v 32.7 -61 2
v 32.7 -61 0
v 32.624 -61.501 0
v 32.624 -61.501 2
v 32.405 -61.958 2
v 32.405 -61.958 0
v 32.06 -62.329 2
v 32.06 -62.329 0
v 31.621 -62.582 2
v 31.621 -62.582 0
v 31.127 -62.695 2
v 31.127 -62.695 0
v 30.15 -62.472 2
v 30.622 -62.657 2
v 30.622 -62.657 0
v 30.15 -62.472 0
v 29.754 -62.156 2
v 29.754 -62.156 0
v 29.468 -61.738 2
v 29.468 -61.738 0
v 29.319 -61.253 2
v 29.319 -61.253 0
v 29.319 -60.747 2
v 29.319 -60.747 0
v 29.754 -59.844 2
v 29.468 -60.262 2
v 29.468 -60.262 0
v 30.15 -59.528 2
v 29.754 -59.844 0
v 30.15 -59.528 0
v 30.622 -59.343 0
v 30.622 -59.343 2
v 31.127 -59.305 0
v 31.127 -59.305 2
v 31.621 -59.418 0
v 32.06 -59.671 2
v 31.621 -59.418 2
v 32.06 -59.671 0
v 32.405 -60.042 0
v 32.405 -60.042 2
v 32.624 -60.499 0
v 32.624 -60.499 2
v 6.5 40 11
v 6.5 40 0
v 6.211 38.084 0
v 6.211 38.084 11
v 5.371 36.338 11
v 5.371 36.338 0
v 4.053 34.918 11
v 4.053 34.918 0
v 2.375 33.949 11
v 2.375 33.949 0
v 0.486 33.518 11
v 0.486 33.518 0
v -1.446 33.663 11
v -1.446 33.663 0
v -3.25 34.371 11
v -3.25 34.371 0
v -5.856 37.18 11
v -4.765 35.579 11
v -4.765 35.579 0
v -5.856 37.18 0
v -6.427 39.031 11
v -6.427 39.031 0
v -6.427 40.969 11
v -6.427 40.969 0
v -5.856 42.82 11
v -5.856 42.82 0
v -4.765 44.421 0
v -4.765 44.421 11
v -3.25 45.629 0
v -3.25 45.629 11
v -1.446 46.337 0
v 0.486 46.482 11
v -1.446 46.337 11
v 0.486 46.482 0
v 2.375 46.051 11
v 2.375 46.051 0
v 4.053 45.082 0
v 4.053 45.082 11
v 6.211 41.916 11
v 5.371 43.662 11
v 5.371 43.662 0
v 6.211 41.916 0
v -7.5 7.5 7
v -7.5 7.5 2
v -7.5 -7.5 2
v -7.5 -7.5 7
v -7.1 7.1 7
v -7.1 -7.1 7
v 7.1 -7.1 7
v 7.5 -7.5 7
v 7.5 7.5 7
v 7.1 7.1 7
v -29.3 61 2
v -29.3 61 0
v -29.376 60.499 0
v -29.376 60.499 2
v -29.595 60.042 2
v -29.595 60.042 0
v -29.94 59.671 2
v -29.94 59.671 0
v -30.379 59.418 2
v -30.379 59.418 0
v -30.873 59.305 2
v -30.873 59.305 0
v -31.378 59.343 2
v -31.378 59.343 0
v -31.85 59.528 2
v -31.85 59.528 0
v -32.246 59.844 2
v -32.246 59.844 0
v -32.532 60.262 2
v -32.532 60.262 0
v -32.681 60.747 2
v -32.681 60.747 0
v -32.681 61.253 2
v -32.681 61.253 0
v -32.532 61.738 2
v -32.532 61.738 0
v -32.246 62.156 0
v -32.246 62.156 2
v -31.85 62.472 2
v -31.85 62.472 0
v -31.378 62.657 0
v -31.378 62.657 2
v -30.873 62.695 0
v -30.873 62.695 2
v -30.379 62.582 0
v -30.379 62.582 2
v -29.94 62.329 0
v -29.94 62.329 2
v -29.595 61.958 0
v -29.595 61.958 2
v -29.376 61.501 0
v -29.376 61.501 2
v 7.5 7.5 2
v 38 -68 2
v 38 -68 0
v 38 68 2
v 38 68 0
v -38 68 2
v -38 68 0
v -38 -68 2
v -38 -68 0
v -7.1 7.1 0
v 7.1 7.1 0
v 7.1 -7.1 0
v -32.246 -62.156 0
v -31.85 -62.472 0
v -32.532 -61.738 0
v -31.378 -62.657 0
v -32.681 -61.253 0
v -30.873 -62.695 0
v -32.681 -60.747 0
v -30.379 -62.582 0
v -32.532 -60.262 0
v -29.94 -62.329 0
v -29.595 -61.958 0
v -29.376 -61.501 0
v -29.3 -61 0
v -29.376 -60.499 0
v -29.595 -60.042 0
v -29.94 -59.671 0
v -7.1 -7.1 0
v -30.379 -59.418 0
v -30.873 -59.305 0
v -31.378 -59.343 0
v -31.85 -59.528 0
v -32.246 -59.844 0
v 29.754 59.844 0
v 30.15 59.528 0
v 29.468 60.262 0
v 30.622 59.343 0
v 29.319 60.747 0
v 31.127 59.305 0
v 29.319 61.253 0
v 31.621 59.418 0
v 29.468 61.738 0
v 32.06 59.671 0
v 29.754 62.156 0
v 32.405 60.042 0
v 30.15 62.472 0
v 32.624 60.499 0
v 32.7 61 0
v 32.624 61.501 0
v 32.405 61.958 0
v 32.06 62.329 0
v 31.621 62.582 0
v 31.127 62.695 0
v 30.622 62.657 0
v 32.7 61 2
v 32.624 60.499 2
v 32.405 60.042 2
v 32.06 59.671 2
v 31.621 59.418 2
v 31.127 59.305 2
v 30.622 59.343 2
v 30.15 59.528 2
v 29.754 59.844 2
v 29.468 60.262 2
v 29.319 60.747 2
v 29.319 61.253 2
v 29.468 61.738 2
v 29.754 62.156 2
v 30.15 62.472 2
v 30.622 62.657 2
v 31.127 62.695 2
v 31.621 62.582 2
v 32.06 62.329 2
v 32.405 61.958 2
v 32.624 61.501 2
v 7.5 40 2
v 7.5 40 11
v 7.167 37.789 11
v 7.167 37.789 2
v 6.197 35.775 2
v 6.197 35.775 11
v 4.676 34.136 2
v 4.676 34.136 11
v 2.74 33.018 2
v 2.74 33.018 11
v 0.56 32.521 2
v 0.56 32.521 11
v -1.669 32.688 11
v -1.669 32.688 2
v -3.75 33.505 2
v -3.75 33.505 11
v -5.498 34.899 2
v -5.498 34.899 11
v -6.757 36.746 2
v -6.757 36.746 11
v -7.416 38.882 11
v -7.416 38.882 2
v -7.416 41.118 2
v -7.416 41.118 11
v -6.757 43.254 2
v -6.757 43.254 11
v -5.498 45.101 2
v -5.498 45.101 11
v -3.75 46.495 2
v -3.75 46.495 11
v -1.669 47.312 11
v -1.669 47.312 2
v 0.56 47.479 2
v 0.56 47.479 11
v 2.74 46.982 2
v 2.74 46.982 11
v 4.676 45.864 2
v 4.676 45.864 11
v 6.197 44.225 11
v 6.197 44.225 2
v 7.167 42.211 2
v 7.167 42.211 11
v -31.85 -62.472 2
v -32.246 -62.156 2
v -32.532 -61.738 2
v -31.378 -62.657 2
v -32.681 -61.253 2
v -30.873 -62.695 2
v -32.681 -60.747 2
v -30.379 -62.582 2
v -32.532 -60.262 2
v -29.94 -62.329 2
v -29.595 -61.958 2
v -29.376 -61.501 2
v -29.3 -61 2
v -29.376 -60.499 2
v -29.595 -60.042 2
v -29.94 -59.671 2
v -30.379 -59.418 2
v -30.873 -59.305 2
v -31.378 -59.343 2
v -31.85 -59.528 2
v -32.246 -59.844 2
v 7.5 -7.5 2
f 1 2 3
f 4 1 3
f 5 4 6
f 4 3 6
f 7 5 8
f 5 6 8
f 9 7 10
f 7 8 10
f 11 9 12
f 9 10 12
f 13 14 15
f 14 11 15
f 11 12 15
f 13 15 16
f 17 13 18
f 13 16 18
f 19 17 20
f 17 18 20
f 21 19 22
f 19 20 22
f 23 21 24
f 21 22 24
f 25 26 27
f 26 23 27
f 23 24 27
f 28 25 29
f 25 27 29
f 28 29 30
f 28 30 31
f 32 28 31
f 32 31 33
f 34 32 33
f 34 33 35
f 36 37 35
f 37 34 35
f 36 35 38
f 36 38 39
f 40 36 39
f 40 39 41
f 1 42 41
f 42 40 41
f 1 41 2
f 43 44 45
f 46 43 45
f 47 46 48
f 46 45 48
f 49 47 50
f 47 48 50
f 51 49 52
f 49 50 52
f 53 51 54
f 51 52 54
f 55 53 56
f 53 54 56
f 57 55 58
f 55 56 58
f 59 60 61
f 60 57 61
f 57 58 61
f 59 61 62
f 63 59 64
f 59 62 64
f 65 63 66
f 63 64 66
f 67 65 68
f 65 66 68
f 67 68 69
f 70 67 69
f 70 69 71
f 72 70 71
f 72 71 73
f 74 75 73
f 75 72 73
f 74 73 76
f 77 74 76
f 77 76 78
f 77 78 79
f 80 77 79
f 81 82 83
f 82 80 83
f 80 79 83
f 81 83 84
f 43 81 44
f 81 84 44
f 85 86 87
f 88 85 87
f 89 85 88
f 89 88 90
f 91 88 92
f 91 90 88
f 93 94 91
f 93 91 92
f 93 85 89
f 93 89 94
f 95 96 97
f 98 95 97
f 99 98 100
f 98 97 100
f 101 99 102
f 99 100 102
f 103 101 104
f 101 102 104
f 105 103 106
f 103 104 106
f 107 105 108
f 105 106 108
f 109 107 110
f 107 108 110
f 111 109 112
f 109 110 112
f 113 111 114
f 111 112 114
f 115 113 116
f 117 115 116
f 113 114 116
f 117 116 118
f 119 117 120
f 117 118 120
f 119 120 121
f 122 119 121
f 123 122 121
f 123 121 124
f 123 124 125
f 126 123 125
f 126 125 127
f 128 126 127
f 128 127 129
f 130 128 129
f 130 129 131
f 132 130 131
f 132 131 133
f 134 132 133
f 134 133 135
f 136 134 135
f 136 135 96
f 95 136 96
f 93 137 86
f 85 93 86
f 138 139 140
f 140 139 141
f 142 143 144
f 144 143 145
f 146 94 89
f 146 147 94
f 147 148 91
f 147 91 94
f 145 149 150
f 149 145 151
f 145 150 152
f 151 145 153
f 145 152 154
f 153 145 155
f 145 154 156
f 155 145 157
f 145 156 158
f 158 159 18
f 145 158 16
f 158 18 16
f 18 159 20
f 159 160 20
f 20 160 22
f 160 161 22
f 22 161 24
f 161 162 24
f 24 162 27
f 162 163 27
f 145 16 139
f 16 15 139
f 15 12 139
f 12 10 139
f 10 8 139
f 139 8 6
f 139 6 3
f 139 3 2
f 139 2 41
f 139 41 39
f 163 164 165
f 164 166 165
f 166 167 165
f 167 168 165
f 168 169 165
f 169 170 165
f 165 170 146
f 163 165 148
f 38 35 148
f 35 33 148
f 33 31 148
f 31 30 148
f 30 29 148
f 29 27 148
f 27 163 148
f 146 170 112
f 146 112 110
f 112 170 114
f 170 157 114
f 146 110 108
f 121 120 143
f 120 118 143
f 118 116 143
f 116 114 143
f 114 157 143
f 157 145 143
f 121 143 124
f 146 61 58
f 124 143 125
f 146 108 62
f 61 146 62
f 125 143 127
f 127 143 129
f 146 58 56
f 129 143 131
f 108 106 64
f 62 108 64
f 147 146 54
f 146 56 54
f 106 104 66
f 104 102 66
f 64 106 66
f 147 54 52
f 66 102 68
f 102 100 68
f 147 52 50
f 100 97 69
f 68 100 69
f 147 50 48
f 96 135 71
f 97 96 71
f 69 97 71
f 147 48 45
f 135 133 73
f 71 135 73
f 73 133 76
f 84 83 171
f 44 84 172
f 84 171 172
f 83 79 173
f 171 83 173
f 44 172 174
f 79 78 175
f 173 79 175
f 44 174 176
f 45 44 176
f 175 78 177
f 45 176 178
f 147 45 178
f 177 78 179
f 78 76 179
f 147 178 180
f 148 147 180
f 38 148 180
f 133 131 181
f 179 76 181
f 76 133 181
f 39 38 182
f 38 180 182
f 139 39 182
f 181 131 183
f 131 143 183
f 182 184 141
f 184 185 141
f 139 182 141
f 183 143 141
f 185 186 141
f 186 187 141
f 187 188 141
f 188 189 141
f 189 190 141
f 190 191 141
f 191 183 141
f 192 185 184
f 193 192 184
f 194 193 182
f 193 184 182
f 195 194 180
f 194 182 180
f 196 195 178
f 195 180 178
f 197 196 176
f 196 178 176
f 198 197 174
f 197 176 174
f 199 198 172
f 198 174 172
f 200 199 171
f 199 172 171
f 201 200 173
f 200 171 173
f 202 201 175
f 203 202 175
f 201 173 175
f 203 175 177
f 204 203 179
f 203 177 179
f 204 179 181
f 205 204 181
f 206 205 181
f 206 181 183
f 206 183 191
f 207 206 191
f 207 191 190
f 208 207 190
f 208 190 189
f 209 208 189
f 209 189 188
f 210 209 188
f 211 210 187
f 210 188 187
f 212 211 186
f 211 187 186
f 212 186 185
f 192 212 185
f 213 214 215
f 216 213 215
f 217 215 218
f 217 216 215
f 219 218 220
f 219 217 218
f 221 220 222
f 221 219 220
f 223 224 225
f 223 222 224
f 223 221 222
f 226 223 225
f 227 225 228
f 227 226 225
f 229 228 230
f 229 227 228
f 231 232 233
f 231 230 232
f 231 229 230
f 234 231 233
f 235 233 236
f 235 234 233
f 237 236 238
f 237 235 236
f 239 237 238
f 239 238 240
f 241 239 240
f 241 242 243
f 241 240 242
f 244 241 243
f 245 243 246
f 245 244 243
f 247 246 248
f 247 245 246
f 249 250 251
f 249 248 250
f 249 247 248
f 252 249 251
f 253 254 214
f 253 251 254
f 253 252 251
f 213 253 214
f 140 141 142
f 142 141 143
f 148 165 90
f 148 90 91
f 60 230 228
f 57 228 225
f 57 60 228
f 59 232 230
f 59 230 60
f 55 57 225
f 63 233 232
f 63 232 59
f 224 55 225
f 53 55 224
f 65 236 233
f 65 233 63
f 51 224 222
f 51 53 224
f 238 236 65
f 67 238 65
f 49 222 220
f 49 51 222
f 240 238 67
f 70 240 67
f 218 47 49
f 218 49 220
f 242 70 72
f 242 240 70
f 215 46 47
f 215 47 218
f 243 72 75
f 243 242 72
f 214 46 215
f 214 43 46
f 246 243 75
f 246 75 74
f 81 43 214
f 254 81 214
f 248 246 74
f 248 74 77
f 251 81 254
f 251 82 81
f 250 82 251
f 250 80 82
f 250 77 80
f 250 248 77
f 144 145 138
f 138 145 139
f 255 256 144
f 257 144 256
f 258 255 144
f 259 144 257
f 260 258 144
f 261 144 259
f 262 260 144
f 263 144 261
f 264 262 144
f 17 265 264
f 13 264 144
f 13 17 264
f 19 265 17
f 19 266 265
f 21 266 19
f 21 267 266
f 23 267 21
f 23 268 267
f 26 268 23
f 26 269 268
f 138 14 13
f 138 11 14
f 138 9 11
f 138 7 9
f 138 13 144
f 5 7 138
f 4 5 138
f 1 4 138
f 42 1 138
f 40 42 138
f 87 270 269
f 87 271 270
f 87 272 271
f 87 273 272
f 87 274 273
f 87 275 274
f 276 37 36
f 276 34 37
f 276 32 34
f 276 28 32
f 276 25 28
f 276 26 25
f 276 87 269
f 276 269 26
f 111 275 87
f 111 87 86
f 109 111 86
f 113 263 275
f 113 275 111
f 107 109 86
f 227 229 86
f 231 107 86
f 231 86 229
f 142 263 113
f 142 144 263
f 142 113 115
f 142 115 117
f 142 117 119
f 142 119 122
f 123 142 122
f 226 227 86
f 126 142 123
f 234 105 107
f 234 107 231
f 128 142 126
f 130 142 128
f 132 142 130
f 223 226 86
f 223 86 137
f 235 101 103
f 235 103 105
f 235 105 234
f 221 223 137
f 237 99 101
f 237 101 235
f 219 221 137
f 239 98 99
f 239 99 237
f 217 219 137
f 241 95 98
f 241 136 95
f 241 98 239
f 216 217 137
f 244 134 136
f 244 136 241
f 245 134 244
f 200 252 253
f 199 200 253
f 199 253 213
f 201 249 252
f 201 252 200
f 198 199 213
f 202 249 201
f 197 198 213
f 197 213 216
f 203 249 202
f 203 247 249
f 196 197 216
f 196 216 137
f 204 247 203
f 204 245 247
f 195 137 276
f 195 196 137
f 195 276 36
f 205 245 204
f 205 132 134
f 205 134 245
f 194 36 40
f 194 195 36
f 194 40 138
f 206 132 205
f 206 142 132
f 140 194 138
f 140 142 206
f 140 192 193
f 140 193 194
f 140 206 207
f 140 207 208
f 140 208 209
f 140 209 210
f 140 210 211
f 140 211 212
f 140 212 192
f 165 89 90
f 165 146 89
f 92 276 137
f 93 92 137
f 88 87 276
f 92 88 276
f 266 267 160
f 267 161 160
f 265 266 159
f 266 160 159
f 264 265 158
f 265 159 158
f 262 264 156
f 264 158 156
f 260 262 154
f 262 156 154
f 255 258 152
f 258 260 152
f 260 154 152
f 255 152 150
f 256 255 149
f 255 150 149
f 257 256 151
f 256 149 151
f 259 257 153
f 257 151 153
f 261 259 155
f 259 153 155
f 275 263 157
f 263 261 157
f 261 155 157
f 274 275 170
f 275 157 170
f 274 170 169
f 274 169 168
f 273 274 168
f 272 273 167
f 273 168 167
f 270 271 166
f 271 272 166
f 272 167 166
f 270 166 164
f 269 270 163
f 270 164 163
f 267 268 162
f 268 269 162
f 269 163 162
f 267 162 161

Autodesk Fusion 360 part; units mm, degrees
sketch "Sketch1" plane through (0, 0, 0) normal (0, 0, 1) x (1, 0, 0)
  line L0 (38, 68) -> (-38, 68)
  line L1 (-38, 68) -> (-38, -68)
  line L2 (-38, -68) -> (38, -68)
  line L3 (38, -68) -> (38, 68)
  line L4 (38, 68) -> (-38, -68) construction
  line L5 (-38, 68) -> (38, -68) construction
  line L6 (7.1, 7.1) -> (-7.1, 7.1)
  line L7 (-7.1, 7.1) -> (-7.1, -7.1)
  line L8 (-7.1, -7.1) -> (7.1, -7.1)
  line L9 (7.1, -7.1) -> (7.1, 7.1)
  line L10 (7.1, 7.1) -> (-7.1, -7.1) construction
  line L11 (-7.1, 7.1) -> (7.1, -7.1) construction
  circle A0 centre (0, 40) radius 6.5
  circle A1 centre (0, 40) radius 7.5
  line L12 (-38, 68) -> (-31, 68)
  line L13 (-31, 68) -> (-31, 61)
  line L14 (-31, 61) -> (-38, 61)
  line L15 (-38, 61) -> (-38, 68)
  circle A2 centre (-31, 61) radius 1.7
  line L16 (38, 68) -> (31, 68)
  line L17 (31, 68) -> (31, 61)
  line L18 (31, 61) -> (38, 61)
  line L19 (38, 61) -> (38, 68)
  circle A3 centre (31, 61) radius 1.7
  circle A4 centre (-31, -61) radius 1.7
  circle A5 centre (31, -61) radius 1.7
  line L20 (7.5, 7.5) -> (-7.5, 7.5)
  line L21 (-7.5, 7.5) -> (-7.5, -7.5)
  line L22 (-7.5, -7.5) -> (7.5, -7.5)
  line L23 (7.5, -7.5) -> (7.5, 7.5)
  line L24 (7.5, 7.5) -> (-7.5, -7.5) construction
  line L25 (-7.5, 7.5) -> (7.5, -7.5) construction
  dimension "d1" = 76
  dimension "d2" = 136
  dimension "d3" = 14.2
  dimension "d4" = 14.2
  dimension "d5" = 13
  dimension "d6" = 1
  dimension "d7" = 7
  dimension "d8" = 7
  dimension "d9" = 3.4
  dimension "d10" = 7
  dimension "d11" = 7
  dimension "d14" = 62
  dimension "d15" = -122
  dimension "d16" = 15
  dimension "d17" = 15
extrude "Extrude1" add sketch "Sketch1" along normal blind 2 contours L0 L3 L16 L17 L18 L19 A3 | L0 L1 L2 L3 L13 L14 A2 L17 L18 A3 | L0 L1 L12 L13 L14 L15 A2
extrude "Extrude2" add sketch "Sketch1" along normal blind 11 contours A1
extrude "Extrude3" add sketch "Sketch1" along normal blind 7 contours L20 L21 L22 L23
